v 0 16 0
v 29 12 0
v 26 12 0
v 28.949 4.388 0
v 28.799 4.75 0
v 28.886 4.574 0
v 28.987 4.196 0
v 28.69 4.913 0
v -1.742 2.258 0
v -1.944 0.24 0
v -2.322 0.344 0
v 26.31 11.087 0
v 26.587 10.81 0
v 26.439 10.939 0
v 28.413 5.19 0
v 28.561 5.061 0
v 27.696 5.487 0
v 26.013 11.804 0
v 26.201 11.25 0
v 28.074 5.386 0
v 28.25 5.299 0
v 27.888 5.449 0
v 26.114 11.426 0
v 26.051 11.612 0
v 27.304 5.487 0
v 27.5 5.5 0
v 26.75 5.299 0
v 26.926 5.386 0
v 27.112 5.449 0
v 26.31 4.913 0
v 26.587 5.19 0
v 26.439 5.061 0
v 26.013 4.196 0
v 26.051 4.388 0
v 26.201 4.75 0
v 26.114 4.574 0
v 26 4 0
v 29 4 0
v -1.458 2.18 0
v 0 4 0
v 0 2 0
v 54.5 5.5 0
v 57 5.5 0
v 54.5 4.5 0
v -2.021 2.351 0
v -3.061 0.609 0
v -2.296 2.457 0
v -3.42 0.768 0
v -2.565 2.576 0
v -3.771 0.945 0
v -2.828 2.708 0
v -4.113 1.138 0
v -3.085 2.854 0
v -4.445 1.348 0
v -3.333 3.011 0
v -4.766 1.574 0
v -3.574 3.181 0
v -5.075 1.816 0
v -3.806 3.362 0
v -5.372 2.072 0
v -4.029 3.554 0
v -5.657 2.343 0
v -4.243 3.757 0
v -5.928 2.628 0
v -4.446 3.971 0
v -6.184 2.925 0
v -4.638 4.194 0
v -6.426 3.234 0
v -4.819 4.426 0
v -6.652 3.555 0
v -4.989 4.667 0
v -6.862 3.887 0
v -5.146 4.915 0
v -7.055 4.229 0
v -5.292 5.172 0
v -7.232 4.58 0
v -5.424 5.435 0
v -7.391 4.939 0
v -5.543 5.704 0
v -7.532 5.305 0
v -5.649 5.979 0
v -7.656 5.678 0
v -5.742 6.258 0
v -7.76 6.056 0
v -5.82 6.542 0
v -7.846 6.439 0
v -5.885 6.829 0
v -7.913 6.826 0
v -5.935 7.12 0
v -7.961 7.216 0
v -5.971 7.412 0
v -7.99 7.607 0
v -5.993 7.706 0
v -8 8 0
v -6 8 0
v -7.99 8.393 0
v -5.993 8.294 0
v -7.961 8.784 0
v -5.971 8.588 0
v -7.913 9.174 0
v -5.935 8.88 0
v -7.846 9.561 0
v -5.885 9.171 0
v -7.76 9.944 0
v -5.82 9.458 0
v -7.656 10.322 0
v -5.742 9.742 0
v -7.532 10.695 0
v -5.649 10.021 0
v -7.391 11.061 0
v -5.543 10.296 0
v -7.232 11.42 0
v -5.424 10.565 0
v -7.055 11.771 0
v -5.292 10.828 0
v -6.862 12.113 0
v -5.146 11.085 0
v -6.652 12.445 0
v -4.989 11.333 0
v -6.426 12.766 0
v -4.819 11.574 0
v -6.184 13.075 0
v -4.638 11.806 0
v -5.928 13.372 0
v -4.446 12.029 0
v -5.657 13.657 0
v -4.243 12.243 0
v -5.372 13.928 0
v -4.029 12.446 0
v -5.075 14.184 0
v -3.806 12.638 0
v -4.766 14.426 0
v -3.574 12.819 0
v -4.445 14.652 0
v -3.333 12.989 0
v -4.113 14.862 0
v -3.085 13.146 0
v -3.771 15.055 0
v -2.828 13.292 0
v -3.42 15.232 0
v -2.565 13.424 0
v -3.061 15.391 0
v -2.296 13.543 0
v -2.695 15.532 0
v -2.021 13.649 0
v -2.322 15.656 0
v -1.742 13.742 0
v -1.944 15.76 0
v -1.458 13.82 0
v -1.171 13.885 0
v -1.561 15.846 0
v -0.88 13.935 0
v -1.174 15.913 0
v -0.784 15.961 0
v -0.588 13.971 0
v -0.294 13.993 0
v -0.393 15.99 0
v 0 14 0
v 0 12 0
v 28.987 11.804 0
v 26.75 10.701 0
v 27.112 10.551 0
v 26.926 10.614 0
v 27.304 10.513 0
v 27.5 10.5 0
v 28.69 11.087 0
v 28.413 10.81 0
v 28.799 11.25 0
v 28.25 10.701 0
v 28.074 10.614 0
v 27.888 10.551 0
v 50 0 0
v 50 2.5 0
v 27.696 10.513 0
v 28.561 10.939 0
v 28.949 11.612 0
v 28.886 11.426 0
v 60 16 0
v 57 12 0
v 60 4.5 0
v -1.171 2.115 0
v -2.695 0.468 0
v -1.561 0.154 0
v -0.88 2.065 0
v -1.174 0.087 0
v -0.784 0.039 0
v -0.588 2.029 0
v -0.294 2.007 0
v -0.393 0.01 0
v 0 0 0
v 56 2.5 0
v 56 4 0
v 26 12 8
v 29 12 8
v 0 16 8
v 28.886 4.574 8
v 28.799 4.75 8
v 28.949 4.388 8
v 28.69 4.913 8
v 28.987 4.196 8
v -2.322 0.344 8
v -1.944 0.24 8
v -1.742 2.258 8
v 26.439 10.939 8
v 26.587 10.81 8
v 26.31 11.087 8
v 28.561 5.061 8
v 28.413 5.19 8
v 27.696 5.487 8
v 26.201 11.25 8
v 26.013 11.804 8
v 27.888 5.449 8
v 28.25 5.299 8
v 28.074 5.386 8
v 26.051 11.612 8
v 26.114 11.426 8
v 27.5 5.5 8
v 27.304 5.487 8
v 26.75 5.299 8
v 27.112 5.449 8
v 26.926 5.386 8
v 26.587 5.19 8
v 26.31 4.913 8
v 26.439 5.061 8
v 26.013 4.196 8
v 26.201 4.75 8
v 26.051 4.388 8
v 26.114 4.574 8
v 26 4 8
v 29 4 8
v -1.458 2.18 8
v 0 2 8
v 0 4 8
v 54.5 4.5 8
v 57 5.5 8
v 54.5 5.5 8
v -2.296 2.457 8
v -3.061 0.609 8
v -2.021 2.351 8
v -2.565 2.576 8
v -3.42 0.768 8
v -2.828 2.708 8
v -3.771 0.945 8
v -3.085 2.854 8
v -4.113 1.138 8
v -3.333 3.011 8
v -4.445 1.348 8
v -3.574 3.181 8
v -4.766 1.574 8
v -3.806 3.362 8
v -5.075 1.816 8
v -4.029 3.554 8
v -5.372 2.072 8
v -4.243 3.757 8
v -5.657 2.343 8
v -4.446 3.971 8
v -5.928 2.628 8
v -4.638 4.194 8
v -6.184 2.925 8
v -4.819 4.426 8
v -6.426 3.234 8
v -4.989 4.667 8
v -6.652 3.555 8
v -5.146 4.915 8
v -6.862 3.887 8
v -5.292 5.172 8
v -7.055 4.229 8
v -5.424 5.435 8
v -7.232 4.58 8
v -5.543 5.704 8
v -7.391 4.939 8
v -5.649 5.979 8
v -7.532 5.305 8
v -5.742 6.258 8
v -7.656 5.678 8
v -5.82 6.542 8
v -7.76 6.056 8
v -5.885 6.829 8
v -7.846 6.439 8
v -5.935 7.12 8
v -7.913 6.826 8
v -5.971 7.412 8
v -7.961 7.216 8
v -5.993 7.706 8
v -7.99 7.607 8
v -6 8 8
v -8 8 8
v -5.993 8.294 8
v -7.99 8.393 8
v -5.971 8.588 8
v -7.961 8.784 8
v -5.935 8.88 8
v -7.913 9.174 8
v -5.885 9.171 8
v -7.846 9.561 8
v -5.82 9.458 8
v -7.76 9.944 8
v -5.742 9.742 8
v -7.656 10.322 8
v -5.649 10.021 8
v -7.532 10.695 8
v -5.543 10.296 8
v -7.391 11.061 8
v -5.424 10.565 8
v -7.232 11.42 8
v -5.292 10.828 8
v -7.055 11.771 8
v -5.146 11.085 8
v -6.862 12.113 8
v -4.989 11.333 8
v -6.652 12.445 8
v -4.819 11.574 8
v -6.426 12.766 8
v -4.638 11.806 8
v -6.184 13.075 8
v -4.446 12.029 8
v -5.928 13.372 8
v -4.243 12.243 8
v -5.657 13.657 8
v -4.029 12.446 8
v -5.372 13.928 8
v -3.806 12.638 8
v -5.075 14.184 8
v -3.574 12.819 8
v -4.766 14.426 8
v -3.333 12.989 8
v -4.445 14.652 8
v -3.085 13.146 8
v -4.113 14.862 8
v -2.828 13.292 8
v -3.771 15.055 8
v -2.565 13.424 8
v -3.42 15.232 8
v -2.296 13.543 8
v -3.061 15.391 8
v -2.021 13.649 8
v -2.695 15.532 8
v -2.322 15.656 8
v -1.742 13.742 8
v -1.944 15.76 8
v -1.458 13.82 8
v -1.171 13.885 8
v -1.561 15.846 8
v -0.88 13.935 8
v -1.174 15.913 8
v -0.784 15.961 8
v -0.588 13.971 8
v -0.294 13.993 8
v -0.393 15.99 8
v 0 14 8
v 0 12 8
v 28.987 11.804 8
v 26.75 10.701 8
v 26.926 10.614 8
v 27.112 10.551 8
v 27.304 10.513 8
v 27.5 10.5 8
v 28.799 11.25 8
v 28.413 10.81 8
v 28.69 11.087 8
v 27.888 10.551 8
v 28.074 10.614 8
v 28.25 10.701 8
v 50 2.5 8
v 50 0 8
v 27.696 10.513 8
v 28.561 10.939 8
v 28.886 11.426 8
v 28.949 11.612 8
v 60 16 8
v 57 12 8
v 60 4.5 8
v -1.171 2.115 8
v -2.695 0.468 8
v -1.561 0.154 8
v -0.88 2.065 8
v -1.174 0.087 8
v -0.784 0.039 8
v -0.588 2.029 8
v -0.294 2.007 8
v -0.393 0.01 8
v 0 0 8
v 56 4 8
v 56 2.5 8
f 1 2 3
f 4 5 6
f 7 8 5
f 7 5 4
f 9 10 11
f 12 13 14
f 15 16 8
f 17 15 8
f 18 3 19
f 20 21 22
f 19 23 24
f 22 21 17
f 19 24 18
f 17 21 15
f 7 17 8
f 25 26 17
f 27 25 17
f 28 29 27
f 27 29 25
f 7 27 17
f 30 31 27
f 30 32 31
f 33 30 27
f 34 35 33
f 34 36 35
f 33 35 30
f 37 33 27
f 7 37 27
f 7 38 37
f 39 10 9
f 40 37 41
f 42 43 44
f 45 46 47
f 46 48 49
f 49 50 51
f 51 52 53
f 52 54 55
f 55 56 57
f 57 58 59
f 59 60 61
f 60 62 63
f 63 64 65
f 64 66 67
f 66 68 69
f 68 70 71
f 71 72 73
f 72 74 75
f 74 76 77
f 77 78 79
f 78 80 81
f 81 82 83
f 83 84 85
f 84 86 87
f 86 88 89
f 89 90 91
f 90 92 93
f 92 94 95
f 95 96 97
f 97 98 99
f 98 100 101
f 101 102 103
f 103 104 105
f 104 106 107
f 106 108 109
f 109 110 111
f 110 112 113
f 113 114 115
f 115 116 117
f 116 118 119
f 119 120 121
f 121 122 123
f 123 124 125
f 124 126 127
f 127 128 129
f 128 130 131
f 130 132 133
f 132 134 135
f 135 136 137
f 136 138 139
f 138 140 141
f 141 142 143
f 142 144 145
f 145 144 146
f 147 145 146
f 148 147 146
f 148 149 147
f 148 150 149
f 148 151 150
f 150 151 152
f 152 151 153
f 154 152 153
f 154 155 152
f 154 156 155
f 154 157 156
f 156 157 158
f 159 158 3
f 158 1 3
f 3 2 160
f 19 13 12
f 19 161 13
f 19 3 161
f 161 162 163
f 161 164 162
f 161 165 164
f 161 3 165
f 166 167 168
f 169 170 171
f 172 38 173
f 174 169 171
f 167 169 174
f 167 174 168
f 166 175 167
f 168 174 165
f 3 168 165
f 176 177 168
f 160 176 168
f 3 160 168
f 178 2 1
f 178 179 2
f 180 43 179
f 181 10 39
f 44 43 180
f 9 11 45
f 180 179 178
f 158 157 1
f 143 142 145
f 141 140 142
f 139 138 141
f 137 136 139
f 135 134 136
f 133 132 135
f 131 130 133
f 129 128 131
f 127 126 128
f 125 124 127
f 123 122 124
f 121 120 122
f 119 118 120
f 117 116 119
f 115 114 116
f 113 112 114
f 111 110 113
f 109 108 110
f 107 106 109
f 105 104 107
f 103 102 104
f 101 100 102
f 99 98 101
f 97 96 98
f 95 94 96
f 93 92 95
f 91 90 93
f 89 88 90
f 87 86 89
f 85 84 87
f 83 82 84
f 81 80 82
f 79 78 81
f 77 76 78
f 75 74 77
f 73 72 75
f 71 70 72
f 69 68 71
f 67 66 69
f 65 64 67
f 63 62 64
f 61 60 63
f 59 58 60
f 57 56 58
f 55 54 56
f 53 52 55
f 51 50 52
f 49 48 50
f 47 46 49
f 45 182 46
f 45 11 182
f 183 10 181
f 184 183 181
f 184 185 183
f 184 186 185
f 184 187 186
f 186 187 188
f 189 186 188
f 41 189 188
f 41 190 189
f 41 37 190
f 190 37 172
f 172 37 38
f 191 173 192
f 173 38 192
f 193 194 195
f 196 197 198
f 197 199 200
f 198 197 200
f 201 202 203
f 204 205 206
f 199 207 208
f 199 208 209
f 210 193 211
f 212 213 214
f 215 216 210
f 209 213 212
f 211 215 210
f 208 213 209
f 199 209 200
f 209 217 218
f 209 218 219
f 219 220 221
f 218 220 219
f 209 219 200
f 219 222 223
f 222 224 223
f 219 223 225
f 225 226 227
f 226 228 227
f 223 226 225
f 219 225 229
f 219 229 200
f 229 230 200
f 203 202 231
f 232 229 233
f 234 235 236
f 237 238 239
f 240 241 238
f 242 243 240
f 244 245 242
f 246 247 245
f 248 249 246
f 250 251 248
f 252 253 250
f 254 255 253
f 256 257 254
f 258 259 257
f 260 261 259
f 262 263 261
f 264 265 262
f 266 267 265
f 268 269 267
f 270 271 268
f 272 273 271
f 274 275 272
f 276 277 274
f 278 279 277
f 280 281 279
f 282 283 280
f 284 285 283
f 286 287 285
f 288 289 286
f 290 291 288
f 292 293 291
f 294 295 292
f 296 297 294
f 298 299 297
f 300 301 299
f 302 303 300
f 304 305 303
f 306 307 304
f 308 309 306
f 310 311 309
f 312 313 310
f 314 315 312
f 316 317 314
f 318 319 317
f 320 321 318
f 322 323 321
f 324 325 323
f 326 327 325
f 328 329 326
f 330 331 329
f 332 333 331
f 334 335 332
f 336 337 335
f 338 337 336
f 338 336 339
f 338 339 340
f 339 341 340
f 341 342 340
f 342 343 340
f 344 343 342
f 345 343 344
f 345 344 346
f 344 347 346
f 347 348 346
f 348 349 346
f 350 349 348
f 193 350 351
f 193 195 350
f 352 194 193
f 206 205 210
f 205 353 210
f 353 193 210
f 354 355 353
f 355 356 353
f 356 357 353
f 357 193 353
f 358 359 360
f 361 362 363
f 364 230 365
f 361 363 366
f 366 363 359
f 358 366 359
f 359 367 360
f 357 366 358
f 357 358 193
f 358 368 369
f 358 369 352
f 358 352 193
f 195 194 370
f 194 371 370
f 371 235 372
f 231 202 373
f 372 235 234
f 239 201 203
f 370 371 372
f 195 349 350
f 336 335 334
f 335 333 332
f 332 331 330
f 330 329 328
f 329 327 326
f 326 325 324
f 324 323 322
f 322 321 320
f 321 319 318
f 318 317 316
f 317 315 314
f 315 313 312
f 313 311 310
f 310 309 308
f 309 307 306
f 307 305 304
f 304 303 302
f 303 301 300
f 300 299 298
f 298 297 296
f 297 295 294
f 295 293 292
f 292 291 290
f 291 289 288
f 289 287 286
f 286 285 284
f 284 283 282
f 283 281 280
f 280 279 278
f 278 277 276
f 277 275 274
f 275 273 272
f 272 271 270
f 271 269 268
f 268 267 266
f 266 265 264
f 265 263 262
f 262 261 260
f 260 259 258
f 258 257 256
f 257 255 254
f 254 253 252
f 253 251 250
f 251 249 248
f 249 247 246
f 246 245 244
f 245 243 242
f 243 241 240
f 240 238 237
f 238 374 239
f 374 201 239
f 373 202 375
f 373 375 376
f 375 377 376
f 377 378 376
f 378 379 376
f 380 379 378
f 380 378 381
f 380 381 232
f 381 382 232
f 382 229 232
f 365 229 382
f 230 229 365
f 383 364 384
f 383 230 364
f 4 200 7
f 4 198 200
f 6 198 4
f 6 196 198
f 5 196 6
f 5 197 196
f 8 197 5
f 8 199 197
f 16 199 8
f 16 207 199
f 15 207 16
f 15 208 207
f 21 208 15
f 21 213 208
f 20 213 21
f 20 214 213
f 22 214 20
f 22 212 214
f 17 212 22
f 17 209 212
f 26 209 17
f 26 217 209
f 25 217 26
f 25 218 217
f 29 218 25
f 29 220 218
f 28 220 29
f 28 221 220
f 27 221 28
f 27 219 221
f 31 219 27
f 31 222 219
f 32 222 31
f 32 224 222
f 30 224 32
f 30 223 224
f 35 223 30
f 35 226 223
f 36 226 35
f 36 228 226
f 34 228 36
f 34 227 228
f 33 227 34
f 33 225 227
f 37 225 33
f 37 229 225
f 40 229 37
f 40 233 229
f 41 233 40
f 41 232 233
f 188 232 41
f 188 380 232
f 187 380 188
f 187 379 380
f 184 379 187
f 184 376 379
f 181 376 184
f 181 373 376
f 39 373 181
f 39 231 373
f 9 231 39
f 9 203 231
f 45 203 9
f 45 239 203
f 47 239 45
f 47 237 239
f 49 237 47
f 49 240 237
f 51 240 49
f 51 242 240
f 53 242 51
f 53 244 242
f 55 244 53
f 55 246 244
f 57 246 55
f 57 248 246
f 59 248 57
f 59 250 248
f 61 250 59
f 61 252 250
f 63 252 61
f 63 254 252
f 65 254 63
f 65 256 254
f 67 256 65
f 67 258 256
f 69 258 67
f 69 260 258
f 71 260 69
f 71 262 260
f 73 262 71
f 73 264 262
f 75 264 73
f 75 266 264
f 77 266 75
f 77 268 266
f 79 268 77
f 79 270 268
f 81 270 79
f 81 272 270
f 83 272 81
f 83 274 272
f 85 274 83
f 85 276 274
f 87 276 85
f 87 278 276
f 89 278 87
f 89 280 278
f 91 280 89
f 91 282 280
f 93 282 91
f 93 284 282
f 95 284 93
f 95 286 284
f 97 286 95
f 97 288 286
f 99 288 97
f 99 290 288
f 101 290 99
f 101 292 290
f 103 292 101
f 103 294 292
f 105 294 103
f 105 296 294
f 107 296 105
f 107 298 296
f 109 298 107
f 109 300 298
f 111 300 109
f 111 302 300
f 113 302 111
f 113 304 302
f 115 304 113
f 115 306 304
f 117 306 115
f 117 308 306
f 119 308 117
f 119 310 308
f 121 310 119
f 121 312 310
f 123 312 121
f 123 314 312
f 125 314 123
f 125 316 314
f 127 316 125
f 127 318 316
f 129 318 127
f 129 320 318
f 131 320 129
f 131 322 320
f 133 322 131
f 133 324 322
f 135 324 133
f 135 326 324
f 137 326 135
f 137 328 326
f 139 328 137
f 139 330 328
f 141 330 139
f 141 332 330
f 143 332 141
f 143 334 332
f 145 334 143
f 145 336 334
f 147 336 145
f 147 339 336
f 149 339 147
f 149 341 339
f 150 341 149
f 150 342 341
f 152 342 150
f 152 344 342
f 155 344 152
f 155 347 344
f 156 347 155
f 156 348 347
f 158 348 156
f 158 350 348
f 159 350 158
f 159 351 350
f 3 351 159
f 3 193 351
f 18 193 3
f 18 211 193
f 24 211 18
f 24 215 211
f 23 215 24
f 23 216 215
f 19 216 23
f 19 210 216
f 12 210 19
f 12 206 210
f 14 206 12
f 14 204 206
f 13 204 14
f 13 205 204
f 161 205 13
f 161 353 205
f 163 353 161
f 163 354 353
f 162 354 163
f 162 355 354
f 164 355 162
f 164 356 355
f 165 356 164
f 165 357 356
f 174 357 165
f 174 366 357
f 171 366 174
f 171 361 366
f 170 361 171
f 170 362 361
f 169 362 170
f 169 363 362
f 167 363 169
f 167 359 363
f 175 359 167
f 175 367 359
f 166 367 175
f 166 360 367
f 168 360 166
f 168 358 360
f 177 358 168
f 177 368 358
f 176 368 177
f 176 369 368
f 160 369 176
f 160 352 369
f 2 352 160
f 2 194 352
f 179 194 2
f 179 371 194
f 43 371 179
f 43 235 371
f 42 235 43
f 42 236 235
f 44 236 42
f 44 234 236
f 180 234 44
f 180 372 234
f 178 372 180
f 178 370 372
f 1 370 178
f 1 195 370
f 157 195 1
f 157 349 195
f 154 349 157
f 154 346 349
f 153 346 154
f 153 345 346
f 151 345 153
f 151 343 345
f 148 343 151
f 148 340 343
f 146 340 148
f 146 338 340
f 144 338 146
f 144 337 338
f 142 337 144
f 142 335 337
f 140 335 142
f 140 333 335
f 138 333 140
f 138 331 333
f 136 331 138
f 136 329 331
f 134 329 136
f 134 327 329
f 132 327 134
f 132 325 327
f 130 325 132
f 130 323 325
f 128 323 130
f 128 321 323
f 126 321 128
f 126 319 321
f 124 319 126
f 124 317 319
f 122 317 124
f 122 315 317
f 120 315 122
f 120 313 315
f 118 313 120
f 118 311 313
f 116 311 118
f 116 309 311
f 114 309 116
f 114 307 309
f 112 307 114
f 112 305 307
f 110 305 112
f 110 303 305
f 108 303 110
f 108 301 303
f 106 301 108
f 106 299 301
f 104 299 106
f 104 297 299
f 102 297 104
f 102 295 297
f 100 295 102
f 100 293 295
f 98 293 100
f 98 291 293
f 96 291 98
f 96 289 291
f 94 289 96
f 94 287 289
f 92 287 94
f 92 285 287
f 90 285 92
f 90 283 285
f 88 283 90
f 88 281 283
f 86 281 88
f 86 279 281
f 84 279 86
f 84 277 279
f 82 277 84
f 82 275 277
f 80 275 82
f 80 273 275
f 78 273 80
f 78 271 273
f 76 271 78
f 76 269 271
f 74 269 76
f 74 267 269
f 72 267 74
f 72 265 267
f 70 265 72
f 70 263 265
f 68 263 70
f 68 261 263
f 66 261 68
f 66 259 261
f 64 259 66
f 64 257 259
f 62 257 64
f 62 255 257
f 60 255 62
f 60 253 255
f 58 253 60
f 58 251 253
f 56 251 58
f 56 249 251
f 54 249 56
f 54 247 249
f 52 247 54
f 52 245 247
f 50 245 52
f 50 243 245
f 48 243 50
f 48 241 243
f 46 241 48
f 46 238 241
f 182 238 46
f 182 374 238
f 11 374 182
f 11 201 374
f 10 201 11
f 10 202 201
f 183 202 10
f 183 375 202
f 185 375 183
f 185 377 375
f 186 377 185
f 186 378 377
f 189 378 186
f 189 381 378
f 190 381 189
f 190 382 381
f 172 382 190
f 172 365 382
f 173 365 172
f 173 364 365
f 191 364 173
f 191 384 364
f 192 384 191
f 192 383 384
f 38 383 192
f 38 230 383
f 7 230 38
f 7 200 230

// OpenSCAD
// KNOWN-WRONG PART (must fail): the hinge is 2 mm thick (inner radius 6) instead of 0.8
// Pinch clamp for silicone tubing (up to 6.4 mm OD) with a living hinge and a snap latch
// Category: quick fixes. One flat profile: two jaws joined by a 0.8 mm half-ring hinge, a
// half-round pinch ridge on each jaw, and a hook on the upper jaw whose nose snaps under the
// lower jaw's thin tongue when the jaws are squeezed together.
// Print: PETG or PP (PLA hinges crack), lying flat, 0.2 mm layers, 100 % infill.
// SPDX-License-Identifier: CERN-OHL-P-2.0

/* [Clamp] */
thickness = 8;            // extrusion along Z
lower_jaw = [50, 4];      // x 0..50, y 0..4
tongue = [50, 56, 2.5];   // x from, x to, y bottom (top at y = 4)
upper_jaw = [60, 12, 16]; // x 0..60, y 12..16
hinge_c = [0, 8];         // half-ring on the x < 0 side
hinge_r = [6, 8];         // inner, outer radius (0.8 mm thick)
ridge_x = 27.5;
ridge_r = 1.5;
leg = [57, 60, 4.5, 12];  // hook leg x from, x to, y from, y to
nose = [54.5, 57, 4.5, 5.5];

/* [Hidden] */
eps = 0.01;

linear_extrude(thickness) union() {
    square(lower_jaw);
    translate([tongue[0], tongue[2]]) square([tongue[1] - tongue[0], lower_jaw.y - tongue[2]]);
    translate([0, upper_jaw[1]]) square([upper_jaw[0], upper_jaw[2] - upper_jaw[1]]);
    intersection() {
        translate(hinge_c) difference() { circle(r = hinge_r[1], $fn = 128); circle(r = hinge_r[0], $fn = 128); }
        translate([-hinge_r[1] - 1, -1]) square([hinge_r[1] + 1 + eps, 2 * hinge_r[1] + 2]);
    }
    translate([ridge_x, lower_jaw.y]) circle(r = ridge_r, $fn = 48);
    translate([ridge_x, upper_jaw[1]]) circle(r = ridge_r, $fn = 48);
    translate([leg[0], leg[2]]) square([leg[1] - leg[0], leg[3] - leg[2] + eps]);
    translate([nose[0], nose[2]]) square([nose[1] - nose[0] + eps, nose[3] - nose[2]]);
}
